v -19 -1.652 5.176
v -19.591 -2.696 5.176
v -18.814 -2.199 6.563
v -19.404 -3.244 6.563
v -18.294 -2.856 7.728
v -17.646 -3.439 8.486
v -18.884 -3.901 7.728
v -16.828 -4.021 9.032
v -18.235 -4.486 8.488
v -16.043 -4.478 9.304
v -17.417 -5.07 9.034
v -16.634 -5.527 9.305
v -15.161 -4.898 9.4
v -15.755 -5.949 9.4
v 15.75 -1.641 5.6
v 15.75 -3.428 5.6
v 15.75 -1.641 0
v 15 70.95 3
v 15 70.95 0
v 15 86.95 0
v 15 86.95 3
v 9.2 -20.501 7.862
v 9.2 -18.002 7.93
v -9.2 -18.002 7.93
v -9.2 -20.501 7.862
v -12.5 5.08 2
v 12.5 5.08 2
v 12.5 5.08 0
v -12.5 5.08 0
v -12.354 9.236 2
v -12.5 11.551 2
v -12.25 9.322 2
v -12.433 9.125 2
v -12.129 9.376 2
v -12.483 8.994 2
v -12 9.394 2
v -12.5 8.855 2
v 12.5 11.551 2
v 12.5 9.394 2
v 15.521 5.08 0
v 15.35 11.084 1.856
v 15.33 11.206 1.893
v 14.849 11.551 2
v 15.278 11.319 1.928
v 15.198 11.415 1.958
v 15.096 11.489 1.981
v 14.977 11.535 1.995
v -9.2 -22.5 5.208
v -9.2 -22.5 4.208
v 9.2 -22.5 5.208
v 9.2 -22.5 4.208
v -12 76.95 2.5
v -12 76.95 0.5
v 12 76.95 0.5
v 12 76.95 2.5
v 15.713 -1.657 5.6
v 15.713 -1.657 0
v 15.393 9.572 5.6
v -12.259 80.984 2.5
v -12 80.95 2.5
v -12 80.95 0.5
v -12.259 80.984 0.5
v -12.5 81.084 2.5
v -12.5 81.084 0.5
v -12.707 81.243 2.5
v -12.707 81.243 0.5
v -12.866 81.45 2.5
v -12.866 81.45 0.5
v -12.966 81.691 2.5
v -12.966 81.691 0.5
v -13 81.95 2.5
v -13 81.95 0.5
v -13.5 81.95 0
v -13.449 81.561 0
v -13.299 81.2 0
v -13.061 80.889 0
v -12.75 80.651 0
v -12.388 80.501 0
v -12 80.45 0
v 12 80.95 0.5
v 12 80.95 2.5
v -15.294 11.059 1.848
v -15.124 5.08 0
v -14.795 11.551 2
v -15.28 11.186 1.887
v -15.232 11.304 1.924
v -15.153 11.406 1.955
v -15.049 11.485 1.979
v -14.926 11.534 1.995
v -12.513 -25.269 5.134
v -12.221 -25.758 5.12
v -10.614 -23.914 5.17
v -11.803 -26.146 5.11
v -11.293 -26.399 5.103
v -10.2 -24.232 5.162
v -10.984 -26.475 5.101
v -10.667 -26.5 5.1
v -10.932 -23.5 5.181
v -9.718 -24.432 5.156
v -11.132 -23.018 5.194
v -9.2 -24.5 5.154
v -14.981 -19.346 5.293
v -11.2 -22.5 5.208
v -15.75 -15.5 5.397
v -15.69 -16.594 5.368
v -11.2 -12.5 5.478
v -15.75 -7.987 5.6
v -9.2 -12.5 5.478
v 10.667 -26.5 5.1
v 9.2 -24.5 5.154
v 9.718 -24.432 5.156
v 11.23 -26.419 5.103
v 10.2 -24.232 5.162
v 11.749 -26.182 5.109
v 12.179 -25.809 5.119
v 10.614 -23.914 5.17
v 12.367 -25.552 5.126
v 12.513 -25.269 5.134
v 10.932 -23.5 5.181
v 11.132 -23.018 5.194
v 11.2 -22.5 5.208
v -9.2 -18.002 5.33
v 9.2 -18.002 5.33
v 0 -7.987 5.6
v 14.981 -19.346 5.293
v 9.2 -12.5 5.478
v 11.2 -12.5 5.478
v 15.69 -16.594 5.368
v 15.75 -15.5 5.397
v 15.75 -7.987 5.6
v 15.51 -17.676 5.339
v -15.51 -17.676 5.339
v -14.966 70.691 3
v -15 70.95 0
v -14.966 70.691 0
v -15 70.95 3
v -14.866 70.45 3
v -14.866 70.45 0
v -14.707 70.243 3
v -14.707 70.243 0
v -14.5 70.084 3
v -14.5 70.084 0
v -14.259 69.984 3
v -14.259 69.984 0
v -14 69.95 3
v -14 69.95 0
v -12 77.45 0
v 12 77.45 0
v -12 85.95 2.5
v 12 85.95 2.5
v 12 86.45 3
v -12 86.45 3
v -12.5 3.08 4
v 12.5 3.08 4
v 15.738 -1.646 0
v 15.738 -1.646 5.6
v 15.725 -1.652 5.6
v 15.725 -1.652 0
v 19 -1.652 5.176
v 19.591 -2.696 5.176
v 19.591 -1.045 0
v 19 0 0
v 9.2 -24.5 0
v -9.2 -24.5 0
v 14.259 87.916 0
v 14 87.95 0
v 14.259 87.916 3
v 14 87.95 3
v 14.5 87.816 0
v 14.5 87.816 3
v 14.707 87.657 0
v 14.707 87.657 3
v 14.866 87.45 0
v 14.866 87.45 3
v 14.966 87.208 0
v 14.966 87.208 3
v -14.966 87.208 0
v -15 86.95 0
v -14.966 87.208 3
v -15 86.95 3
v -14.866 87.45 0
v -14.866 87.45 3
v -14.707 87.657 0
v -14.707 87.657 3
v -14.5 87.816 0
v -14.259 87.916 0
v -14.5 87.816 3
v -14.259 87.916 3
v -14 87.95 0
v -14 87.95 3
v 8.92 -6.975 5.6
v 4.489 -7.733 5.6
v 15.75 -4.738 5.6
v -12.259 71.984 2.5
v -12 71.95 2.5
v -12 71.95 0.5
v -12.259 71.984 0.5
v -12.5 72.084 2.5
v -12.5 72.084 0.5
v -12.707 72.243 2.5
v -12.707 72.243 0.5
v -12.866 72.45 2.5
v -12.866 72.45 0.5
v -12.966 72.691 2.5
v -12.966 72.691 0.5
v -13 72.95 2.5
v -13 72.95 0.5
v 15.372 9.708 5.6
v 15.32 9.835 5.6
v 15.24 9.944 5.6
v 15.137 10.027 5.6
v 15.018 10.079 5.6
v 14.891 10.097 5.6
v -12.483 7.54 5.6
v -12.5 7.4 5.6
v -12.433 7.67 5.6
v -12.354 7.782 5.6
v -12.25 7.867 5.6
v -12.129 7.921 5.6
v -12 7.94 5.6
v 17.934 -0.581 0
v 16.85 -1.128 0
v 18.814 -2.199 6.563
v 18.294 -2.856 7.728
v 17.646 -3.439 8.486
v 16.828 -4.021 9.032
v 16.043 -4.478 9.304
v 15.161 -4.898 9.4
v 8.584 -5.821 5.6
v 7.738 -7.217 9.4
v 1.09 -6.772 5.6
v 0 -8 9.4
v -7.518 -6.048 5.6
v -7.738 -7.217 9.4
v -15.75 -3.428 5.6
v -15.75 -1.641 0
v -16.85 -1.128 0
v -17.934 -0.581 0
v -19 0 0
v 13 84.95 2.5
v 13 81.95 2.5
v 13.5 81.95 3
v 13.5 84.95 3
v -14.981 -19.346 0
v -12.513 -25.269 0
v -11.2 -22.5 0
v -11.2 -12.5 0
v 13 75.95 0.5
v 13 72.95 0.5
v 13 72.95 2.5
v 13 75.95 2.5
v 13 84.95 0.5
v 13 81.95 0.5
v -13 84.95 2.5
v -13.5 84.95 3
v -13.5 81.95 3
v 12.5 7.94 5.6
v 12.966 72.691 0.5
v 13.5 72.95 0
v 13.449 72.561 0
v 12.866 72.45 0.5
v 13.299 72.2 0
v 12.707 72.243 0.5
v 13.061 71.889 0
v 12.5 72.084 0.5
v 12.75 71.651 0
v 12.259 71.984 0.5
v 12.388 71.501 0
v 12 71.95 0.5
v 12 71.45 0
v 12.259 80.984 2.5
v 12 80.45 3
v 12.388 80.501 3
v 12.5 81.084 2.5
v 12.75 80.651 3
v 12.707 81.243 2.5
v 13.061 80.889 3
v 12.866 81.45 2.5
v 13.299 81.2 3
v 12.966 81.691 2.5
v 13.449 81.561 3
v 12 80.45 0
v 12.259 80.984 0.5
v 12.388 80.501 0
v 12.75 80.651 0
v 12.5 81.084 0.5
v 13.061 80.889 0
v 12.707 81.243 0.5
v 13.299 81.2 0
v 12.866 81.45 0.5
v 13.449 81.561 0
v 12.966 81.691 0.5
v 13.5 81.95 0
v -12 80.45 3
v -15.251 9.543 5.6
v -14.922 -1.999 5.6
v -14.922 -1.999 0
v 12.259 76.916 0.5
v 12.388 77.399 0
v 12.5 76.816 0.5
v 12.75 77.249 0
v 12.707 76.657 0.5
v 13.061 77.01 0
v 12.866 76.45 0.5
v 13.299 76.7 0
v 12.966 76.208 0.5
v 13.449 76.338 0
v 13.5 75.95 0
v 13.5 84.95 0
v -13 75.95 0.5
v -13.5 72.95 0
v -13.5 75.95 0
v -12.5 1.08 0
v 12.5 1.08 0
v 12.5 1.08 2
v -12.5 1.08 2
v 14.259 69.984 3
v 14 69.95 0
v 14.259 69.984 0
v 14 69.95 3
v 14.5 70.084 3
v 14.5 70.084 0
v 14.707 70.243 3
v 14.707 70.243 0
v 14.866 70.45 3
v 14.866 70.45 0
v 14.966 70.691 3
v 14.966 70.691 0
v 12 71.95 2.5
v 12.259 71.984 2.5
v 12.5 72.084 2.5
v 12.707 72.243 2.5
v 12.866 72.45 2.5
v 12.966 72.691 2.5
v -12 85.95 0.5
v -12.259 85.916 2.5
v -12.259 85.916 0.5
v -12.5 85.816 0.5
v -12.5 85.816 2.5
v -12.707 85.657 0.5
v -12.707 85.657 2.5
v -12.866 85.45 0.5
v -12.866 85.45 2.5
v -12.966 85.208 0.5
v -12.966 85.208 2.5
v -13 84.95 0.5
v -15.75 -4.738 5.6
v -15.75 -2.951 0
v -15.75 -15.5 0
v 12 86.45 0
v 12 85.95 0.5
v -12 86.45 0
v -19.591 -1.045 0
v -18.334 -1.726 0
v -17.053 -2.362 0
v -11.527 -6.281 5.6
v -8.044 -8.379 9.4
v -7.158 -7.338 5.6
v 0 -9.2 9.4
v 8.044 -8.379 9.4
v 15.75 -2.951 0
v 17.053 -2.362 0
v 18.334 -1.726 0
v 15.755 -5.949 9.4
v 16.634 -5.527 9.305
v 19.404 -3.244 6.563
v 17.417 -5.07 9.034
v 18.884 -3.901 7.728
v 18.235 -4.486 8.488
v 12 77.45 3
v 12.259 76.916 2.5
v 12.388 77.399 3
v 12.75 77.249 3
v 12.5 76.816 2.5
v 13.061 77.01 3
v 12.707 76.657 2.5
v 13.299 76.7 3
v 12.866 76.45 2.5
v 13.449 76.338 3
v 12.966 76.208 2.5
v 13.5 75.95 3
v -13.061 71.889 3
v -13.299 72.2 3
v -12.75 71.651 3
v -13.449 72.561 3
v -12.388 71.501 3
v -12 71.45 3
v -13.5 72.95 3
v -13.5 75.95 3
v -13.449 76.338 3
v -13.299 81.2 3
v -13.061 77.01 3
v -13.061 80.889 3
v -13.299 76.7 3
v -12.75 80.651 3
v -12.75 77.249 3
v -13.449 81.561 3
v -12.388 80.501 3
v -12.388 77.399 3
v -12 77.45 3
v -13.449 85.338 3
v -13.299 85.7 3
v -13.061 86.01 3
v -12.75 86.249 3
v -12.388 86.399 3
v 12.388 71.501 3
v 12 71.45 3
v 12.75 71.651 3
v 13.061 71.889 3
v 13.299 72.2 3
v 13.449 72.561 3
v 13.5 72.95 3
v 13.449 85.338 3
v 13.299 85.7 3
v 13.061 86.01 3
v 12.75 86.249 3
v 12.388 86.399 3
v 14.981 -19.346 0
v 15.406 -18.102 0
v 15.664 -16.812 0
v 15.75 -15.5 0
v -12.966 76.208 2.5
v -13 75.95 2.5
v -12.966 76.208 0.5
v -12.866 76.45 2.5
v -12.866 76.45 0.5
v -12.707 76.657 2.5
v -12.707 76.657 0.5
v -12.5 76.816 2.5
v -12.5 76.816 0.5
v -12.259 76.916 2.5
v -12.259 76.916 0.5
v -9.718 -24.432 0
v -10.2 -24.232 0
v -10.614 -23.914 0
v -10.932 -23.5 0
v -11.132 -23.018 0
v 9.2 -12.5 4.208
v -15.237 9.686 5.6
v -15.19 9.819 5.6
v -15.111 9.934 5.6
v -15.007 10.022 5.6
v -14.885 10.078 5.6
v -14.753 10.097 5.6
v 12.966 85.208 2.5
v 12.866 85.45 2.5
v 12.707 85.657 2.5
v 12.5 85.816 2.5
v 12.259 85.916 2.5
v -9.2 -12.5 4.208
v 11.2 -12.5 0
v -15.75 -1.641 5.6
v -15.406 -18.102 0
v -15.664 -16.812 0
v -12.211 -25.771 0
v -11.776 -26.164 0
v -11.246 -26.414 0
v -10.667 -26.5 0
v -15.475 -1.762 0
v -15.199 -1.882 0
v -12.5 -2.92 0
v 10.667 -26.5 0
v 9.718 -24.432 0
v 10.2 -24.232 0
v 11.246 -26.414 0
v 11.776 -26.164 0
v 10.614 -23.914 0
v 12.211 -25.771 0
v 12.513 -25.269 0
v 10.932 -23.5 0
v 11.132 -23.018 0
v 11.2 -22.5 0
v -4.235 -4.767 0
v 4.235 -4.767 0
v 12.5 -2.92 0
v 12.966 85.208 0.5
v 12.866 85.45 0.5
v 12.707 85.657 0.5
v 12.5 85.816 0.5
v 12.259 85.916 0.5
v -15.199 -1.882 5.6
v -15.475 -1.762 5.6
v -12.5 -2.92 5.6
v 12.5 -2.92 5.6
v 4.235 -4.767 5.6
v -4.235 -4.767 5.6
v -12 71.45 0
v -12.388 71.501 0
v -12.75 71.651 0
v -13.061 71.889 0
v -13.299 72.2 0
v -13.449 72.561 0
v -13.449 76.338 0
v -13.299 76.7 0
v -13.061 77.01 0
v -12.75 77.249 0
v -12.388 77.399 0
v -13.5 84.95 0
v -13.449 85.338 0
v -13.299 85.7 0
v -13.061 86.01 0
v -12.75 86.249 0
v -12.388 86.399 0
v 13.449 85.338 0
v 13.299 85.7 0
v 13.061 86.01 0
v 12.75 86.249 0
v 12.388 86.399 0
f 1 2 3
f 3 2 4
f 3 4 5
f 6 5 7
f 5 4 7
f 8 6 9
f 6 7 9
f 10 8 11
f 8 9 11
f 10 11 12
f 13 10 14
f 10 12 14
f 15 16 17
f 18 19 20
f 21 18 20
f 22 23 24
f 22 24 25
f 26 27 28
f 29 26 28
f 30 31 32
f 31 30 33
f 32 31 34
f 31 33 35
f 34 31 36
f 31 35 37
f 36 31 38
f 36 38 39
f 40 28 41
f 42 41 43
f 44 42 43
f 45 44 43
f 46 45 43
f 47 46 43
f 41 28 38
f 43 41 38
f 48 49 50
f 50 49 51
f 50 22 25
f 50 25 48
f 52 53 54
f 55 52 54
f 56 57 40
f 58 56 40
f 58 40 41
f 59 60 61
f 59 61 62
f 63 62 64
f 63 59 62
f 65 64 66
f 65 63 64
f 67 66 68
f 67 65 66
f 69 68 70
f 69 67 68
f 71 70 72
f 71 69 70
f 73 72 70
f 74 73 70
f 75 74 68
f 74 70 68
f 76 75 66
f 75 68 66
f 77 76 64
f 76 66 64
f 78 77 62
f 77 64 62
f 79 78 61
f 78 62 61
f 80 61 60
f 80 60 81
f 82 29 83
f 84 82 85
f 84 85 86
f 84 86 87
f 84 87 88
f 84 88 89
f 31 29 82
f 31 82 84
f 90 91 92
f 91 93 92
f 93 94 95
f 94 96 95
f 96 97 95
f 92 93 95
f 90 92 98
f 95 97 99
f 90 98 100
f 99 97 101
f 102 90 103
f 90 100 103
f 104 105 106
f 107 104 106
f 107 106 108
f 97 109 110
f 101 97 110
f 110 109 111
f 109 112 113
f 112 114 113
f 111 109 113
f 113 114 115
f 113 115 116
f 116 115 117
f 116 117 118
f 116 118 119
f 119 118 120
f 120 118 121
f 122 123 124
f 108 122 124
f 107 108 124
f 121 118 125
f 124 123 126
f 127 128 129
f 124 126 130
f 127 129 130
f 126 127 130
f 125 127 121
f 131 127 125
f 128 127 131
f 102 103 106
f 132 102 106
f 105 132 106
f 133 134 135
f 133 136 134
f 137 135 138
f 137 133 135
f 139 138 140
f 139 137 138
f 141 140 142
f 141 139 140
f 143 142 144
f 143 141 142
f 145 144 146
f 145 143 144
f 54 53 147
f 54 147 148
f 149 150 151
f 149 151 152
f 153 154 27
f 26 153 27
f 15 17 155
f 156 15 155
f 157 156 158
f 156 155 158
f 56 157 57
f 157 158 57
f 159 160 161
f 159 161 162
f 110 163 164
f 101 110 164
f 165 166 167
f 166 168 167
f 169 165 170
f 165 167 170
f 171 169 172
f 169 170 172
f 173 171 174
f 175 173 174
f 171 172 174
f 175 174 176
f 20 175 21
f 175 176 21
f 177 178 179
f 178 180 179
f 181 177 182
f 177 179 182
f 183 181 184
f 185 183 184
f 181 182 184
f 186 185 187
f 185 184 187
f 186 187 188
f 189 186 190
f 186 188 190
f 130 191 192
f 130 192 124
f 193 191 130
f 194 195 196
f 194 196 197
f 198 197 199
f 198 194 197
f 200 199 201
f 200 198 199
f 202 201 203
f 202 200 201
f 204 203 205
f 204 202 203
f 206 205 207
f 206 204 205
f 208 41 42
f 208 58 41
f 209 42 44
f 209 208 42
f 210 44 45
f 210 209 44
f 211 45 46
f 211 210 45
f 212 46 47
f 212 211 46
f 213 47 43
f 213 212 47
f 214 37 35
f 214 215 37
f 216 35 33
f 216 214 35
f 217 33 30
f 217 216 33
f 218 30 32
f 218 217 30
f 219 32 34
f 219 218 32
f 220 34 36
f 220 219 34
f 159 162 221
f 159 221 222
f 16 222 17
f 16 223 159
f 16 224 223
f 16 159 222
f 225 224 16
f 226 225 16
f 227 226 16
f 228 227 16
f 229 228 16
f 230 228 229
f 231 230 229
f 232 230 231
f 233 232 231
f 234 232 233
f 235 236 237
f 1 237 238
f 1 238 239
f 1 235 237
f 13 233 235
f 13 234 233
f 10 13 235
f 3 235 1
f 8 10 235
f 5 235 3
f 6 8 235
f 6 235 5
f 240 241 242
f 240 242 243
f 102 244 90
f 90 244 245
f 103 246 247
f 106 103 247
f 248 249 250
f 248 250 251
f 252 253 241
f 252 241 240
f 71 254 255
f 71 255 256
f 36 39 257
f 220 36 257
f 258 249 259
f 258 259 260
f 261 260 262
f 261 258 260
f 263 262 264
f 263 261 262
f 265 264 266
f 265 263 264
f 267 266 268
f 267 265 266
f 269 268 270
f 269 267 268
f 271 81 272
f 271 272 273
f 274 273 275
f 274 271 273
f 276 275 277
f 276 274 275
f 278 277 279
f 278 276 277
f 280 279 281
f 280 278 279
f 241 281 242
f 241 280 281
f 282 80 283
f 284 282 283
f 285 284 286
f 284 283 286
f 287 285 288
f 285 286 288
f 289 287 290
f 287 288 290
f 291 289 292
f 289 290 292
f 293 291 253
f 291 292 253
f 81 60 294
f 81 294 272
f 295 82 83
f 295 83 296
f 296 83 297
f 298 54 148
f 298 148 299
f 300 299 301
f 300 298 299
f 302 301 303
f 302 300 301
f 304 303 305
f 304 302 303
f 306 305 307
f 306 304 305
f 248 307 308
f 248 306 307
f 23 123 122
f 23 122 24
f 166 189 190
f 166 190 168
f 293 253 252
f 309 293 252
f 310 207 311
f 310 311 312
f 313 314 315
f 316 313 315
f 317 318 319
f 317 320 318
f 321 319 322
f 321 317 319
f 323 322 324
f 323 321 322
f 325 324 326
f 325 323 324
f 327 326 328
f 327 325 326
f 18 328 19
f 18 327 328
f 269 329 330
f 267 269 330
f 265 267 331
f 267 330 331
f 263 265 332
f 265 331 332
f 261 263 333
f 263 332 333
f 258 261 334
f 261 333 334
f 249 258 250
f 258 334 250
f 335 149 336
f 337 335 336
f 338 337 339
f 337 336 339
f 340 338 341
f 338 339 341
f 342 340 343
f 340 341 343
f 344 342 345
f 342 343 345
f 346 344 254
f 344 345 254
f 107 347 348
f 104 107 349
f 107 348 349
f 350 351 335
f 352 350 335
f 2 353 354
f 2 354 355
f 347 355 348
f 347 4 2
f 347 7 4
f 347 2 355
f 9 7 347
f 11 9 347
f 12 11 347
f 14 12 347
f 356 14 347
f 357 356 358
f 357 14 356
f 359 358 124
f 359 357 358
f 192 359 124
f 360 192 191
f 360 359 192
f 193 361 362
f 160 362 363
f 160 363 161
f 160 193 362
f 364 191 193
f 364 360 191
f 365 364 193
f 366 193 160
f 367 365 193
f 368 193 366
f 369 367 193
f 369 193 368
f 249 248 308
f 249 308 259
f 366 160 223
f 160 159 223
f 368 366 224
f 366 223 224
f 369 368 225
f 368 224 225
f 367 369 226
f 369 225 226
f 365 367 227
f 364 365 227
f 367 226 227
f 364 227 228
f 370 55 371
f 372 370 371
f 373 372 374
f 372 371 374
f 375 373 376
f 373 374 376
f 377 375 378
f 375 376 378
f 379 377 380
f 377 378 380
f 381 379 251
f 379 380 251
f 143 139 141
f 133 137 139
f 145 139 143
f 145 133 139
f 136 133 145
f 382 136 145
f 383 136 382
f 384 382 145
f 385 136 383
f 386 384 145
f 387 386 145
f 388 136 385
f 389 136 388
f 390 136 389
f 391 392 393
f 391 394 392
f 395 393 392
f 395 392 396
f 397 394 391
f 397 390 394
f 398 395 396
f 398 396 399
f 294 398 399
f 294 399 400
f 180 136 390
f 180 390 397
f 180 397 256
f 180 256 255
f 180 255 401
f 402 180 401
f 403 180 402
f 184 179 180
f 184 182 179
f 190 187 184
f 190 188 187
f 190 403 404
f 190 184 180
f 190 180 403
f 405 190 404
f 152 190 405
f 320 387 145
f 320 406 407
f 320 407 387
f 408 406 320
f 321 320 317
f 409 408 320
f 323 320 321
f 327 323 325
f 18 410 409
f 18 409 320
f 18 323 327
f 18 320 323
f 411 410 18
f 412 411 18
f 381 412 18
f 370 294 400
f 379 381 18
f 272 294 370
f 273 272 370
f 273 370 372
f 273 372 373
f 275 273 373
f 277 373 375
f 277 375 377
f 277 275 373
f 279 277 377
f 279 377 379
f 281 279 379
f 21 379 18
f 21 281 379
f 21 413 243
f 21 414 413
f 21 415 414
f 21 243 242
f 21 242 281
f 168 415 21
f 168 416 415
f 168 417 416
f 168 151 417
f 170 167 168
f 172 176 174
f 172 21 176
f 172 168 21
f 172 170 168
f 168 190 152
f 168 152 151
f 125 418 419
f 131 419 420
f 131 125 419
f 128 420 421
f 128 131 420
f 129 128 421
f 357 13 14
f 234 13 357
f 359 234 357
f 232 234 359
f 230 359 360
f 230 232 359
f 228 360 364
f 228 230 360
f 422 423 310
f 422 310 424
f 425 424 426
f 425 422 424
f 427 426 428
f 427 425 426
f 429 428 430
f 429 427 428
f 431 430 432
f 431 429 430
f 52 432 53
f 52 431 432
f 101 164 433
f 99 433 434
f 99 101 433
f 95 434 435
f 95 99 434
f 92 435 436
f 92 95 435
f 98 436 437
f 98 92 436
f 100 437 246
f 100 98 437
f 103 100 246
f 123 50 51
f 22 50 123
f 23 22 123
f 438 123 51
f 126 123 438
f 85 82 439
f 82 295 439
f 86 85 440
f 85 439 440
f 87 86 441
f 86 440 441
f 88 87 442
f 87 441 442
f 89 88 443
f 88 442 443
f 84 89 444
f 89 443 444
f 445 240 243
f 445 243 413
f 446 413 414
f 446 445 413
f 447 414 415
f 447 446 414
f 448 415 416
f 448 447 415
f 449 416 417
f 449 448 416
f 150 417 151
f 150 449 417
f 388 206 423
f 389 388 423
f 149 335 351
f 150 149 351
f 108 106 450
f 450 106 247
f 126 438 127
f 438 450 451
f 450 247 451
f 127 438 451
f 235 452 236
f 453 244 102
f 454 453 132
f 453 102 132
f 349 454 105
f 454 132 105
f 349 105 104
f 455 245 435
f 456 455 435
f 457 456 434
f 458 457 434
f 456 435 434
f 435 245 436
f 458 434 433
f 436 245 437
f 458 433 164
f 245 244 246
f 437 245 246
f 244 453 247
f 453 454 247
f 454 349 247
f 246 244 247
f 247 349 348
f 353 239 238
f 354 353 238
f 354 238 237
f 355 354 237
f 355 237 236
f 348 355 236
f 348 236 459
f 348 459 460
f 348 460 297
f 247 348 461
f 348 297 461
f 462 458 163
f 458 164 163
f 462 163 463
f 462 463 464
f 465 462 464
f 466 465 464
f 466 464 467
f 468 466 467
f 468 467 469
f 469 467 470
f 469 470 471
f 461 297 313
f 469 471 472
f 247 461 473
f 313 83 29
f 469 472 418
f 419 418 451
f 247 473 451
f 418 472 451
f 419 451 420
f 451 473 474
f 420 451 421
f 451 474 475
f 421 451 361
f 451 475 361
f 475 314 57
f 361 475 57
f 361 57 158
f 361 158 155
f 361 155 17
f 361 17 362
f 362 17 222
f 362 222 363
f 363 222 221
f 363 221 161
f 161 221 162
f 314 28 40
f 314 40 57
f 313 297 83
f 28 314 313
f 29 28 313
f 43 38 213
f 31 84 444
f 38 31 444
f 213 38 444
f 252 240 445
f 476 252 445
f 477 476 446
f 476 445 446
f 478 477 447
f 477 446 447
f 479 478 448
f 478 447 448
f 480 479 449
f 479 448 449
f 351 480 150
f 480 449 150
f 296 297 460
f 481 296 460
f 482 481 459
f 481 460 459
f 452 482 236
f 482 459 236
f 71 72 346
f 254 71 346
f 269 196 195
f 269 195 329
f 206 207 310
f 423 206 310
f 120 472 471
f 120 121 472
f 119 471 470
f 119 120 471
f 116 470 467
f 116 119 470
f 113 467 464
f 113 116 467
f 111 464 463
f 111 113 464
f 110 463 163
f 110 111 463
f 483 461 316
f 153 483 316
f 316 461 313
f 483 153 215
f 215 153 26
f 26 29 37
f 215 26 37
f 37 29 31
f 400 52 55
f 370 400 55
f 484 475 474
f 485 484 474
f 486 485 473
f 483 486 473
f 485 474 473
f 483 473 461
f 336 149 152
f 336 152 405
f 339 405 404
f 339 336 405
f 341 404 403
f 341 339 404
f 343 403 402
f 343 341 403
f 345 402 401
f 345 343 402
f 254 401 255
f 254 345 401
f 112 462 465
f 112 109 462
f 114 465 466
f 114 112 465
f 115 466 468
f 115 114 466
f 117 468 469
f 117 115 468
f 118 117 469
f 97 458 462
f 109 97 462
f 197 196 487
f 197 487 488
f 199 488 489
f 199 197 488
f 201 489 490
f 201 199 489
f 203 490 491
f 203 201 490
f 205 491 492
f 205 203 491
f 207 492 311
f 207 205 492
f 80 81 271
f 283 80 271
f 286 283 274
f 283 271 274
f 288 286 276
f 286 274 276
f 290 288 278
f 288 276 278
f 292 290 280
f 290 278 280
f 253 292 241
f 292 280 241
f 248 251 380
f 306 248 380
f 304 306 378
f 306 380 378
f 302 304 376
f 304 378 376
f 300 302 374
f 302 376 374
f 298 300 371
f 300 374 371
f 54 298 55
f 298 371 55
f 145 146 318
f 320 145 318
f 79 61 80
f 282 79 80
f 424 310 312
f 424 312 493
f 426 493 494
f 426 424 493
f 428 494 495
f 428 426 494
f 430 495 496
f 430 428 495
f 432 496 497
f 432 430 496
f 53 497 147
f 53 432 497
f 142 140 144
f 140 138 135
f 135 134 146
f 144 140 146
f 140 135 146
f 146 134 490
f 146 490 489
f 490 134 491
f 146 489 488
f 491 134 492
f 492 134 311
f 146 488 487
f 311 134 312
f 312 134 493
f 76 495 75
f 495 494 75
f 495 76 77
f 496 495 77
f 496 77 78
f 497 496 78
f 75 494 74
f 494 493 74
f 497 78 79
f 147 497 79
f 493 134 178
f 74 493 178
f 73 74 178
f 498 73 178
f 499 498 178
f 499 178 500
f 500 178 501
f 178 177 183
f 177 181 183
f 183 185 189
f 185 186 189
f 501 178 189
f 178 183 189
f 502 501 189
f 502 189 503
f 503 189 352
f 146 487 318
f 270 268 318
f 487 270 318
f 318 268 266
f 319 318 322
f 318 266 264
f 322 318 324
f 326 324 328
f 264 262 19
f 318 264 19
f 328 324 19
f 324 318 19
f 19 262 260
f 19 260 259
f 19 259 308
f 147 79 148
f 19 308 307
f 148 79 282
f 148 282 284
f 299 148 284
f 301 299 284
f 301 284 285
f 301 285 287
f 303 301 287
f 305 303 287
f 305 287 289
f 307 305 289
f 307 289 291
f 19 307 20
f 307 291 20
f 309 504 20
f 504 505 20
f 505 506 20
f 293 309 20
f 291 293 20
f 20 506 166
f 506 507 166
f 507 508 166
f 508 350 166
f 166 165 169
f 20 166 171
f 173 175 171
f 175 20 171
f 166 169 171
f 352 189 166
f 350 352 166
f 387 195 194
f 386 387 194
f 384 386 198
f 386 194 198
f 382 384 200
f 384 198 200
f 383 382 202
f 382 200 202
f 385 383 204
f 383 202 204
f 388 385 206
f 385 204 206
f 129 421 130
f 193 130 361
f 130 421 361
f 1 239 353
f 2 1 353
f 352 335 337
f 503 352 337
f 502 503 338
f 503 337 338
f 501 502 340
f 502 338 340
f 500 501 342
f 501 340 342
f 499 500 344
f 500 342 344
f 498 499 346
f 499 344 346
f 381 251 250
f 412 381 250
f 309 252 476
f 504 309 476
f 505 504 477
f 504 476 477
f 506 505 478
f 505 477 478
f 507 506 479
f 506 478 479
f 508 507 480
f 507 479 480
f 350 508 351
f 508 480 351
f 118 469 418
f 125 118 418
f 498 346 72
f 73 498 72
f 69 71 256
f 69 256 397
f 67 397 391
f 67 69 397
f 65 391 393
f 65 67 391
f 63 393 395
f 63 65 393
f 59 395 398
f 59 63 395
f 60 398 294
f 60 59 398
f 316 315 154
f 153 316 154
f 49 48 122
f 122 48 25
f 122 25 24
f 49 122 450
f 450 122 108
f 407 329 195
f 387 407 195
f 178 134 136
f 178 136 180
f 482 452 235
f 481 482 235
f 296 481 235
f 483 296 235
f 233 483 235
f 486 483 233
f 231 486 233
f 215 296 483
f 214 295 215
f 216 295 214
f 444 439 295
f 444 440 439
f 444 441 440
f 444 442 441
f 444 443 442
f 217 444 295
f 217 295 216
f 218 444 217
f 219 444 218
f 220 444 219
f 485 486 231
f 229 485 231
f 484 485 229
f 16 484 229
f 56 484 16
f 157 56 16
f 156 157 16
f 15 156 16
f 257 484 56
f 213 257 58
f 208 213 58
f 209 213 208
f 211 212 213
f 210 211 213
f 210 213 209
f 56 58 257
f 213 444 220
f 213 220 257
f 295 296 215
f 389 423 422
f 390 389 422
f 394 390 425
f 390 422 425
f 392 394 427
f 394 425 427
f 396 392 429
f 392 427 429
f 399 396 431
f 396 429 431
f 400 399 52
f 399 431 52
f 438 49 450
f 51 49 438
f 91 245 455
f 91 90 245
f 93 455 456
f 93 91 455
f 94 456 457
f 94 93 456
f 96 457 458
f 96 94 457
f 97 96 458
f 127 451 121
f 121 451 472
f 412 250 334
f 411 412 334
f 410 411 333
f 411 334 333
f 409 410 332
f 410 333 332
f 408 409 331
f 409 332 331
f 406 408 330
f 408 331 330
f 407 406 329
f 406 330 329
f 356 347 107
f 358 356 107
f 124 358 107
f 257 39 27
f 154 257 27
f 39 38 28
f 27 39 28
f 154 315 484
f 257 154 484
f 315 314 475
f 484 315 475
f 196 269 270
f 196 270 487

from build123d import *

# Parameters (mm, degrees)
F4_DEPTH       = 5.6
F6_DEPTH       = 19.5916736751
F6_DEPTH_BACK  = 19.5916736751
F8_DEPTH       = 9.2
F8_DEPTH_BACK  = 9.2
F9_W           = 18.4
F9_H           = 10
F11_DEPTH      = 4.2083354886
F13_DEPTH      = 5.6
F15_DEPTH      = 25
F16_DEPTH      = 7.0916736751
F16_DEPTH_BACK = 32.0916736751
F17_R          = 2
F18_R          = 10
F19_R          = 5
F20_R          = 0.5
F21_W          = 30
F21_H          = 18
F21_W_2        = 26
F21_H_2        = 5
F22_DEPTH      = 3
F23_R          = 1
F24_SIZE       = 0.5


with BuildPart() as f2:
    # F2: sweep along a path in F1
    with BuildLine(Plane.YZ) as f2_path:
        Line((-5, 0), (-8, 9.4))
    # F0 (on Top) → F2 (sweep)
    with BuildSketch(Plane.XY):
        with BuildLine():
            ThreePointArc((19, 0), (0, -5), (-19, 0))
            Line((-19, 0), (-19.5906735751, -1.0445595855))
            ThreePointArc((-19.5906735751, -1.0445595855), (0, -6.2), (19.5906735751, -1.0445595855))
            Line((19.5906735751, -1.0445595855), (19, 0))
        make_face()
    sweep(path=f2_path.line)

    # F3 (on Top) → F4 (join)
    with BuildSketch(Plane.XY):
        with BuildLine():
            Line((-15.75, -17.5), (-12, -26.5))
            Line((-12, -26.5), (12, -26.5))
            Line((12, -26.5), (15.75, -17.5))
            Line((15.75, -17.5), (15.75, -1.6405661135))
            ThreePointArc((15.75, -1.6405661135), (0, -5), (-15.75, -1.6405661135))
            Line((-15.75, -1.6405661135), (-15.75, -17.5))
        make_face()
        Polygon((11.2, -24.5), (-11.2, -24.5), (-11.2, -12.5), (-9.2, -12.5), (-9.2, -22.5), (9.2, -22.5), (9.2, -12.5), (11.2, -12.5), align=None, mode=Mode.SUBTRACT)
    extrude(amount=F4_DEPTH)

    # F5 (on Right) → F6 (cut, two sides)
    with BuildSketch(Plane.YZ) as f6_sk:
        Polygon((-26.5, 5.1003851469), (-7.9872340426, 5.6), (-26.5, 5.6), align=None)
    extrude(amount=-F6_DEPTH, mode=Mode.SUBTRACT)
    extrude(f6_sk.sketch, amount=F6_DEPTH_BACK, mode=Mode.SUBTRACT)

    # F7 (on Right) → F8 (join, two sides)
    with BuildSketch(Plane.YZ) as f8_sk:
        Polygon((-20.5007279322, 7.8622910144), (-22.5, 5.2083354886), (-18.0016378474, 5.3297354216), (-18.0016378474, 7.9297354216), align=None)
    extrude(amount=-F8_DEPTH)
    extrude(f8_sk.sketch, amount=F8_DEPTH_BACK)

    # F9 (on face) → F11 (cut, through all)
    with BuildSketch(Plane(origin=(0, 0, 0), x_dir=(1, 0, 0), z_dir=(0, 0, -1))):
        with Locations((0, 17.5)):
            Rectangle(F9_W, F9_H)
    extrude(amount=-F11_DEPTH, mode=Mode.SUBTRACT)

    # F12 (on Top) → F13 (join, through all)
    with BuildSketch(Plane.XY):
        Polygon((-12.5, -2.9510259774), (-12.5, 12.0428740201), (-15.3222584115, 12.0428740201), (-14.894516823, -2.9510259774), align=None)
        Polygon((15.3222584115, 12.0428740201), (12.5, 12.0428740201), (12.5, -2.9510259774), (15.75, -2.9510259774), align=None)
    extrude(amount=F13_DEPTH)

    # F14 (on face) → F15 (join, through all)
    with BuildSketch(Plane(origin=(12.5, 0, 0), x_dir=(0, -1, 0), z_dir=(-1, 0, 0))):
        Polygon((-5.0800054765, 0), (-1.0800054765, 0), (-1.0800054765, 2), (-3.0800054765, 4), (-5.0800054765, 2), align=None)
        Polygon((-10.0967195195, 5.6), (-11.5512139325, 2), (-9.3941444472, 2), (-7.9396500342, 5.6), align=None)
    extrude(amount=F15_DEPTH)

    # F14 (on face) → F16 (cut, two sides)
    with BuildSketch(Plane(origin=(12.5, 0, 0), x_dir=(0, -1, 0), z_dir=(-1, 0, 0))) as f16_sk:
        Polygon((-12.0428740201, 0), (-5.0800054765, 0), (-11.5512139325, 2), (-10.0967195195, 5.6), (-12.0428740201, 5.6), align=None)
    extrude(amount=-F16_DEPTH, mode=Mode.SUBTRACT)
    extrude(f16_sk.sketch, amount=F16_DEPTH_BACK, mode=Mode.SUBTRACT)

    # F17
    f17_edges = [f2.edges().sort_by_distance(p)[0] for p in [
        (-11.2, -24.5, 2.57718),
        (11.2, -24.5, 2.57718),
        (-12, -26.5, 2.550193),
        (12, -26.5, 2.550193),
    ]]
    fillet(f17_edges, radius=F17_R)

    # F18
    f18_edges = [f2.edges().sort_by_distance(p)[0] for p in [
        (15.75, -17.5, 2.671637),
        (-15.75, -17.5, 2.671637),
    ]]
    fillet(f18_edges, radius=F18_R)

    # F19
    f19_edges = [f2.edges().sort_by_distance(p)[0] for p in [
        (-19.295337, -3.52228, 9.4),
        (19.295337, -3.52228, 9.4),
    ]]
    fillet(f19_edges, radius=F19_R)

    # F20
    f20_edges = [f2.edges().sort_by_distance(p)[0] for p in [
        (-15.287486, 10.823967, 3.8),
        (15.357031, 10.823967, 3.8),
        (-12.5, 8.666897, 3.8),
    ]]
    fillet(f20_edges, radius=F20_R)


with BuildPart() as f22:
    # F21 (on Top) → F22 (new body)
    with BuildSketch(Plane.XY):
        with Locations((0, 78.9496248718)):
            Rectangle(F21_W, F21_H)
        with Locations((0, 74.4496248718)):
            Rectangle(F21_W_2, F21_H_2, mode=Mode.SUBTRACT)
        with Locations((0, 83.4496248718)):
            Rectangle(F21_W_2, F21_H_2, mode=Mode.SUBTRACT)
    extrude(amount=F22_DEPTH)

    # F23
    f23_edges = [f22.edges().sort_by_distance(p)[0] for p in [
        (-13, 85.949625, 1.5),
        (13, 85.949625, 1.5),
        (-13, 76.949625, 1.5),
        (-13, 71.949625, 1.5),
        (13, 71.949625, 1.5),
        (13, 76.949625, 1.5),
        (15, 69.949625, 1.5),
        (-15, 69.949625, 1.5),
        (-15, 87.949625, 1.5),
        (13, 80.949625, 1.5),
        (-13, 80.949625, 1.5),
        (15, 87.949625, 1.5),
    ]]
    fillet(f23_edges, radius=F23_R)

    # F24
    f24_edges = [f22.edges().sort_by_distance(p)[0] for p in [
        (0, 80.949625, 3),
        (-13, 83.449625, 3),
        (-12.707107, 85.656732, 3),
        (0, 76.949625, 3),
        (0, 76.949625, 0),
        (0, 80.949625, 0),
    ]]
    chamfer(f24_edges, length=F24_SIZE)


solid = Compound([f2.part, f22.part])
